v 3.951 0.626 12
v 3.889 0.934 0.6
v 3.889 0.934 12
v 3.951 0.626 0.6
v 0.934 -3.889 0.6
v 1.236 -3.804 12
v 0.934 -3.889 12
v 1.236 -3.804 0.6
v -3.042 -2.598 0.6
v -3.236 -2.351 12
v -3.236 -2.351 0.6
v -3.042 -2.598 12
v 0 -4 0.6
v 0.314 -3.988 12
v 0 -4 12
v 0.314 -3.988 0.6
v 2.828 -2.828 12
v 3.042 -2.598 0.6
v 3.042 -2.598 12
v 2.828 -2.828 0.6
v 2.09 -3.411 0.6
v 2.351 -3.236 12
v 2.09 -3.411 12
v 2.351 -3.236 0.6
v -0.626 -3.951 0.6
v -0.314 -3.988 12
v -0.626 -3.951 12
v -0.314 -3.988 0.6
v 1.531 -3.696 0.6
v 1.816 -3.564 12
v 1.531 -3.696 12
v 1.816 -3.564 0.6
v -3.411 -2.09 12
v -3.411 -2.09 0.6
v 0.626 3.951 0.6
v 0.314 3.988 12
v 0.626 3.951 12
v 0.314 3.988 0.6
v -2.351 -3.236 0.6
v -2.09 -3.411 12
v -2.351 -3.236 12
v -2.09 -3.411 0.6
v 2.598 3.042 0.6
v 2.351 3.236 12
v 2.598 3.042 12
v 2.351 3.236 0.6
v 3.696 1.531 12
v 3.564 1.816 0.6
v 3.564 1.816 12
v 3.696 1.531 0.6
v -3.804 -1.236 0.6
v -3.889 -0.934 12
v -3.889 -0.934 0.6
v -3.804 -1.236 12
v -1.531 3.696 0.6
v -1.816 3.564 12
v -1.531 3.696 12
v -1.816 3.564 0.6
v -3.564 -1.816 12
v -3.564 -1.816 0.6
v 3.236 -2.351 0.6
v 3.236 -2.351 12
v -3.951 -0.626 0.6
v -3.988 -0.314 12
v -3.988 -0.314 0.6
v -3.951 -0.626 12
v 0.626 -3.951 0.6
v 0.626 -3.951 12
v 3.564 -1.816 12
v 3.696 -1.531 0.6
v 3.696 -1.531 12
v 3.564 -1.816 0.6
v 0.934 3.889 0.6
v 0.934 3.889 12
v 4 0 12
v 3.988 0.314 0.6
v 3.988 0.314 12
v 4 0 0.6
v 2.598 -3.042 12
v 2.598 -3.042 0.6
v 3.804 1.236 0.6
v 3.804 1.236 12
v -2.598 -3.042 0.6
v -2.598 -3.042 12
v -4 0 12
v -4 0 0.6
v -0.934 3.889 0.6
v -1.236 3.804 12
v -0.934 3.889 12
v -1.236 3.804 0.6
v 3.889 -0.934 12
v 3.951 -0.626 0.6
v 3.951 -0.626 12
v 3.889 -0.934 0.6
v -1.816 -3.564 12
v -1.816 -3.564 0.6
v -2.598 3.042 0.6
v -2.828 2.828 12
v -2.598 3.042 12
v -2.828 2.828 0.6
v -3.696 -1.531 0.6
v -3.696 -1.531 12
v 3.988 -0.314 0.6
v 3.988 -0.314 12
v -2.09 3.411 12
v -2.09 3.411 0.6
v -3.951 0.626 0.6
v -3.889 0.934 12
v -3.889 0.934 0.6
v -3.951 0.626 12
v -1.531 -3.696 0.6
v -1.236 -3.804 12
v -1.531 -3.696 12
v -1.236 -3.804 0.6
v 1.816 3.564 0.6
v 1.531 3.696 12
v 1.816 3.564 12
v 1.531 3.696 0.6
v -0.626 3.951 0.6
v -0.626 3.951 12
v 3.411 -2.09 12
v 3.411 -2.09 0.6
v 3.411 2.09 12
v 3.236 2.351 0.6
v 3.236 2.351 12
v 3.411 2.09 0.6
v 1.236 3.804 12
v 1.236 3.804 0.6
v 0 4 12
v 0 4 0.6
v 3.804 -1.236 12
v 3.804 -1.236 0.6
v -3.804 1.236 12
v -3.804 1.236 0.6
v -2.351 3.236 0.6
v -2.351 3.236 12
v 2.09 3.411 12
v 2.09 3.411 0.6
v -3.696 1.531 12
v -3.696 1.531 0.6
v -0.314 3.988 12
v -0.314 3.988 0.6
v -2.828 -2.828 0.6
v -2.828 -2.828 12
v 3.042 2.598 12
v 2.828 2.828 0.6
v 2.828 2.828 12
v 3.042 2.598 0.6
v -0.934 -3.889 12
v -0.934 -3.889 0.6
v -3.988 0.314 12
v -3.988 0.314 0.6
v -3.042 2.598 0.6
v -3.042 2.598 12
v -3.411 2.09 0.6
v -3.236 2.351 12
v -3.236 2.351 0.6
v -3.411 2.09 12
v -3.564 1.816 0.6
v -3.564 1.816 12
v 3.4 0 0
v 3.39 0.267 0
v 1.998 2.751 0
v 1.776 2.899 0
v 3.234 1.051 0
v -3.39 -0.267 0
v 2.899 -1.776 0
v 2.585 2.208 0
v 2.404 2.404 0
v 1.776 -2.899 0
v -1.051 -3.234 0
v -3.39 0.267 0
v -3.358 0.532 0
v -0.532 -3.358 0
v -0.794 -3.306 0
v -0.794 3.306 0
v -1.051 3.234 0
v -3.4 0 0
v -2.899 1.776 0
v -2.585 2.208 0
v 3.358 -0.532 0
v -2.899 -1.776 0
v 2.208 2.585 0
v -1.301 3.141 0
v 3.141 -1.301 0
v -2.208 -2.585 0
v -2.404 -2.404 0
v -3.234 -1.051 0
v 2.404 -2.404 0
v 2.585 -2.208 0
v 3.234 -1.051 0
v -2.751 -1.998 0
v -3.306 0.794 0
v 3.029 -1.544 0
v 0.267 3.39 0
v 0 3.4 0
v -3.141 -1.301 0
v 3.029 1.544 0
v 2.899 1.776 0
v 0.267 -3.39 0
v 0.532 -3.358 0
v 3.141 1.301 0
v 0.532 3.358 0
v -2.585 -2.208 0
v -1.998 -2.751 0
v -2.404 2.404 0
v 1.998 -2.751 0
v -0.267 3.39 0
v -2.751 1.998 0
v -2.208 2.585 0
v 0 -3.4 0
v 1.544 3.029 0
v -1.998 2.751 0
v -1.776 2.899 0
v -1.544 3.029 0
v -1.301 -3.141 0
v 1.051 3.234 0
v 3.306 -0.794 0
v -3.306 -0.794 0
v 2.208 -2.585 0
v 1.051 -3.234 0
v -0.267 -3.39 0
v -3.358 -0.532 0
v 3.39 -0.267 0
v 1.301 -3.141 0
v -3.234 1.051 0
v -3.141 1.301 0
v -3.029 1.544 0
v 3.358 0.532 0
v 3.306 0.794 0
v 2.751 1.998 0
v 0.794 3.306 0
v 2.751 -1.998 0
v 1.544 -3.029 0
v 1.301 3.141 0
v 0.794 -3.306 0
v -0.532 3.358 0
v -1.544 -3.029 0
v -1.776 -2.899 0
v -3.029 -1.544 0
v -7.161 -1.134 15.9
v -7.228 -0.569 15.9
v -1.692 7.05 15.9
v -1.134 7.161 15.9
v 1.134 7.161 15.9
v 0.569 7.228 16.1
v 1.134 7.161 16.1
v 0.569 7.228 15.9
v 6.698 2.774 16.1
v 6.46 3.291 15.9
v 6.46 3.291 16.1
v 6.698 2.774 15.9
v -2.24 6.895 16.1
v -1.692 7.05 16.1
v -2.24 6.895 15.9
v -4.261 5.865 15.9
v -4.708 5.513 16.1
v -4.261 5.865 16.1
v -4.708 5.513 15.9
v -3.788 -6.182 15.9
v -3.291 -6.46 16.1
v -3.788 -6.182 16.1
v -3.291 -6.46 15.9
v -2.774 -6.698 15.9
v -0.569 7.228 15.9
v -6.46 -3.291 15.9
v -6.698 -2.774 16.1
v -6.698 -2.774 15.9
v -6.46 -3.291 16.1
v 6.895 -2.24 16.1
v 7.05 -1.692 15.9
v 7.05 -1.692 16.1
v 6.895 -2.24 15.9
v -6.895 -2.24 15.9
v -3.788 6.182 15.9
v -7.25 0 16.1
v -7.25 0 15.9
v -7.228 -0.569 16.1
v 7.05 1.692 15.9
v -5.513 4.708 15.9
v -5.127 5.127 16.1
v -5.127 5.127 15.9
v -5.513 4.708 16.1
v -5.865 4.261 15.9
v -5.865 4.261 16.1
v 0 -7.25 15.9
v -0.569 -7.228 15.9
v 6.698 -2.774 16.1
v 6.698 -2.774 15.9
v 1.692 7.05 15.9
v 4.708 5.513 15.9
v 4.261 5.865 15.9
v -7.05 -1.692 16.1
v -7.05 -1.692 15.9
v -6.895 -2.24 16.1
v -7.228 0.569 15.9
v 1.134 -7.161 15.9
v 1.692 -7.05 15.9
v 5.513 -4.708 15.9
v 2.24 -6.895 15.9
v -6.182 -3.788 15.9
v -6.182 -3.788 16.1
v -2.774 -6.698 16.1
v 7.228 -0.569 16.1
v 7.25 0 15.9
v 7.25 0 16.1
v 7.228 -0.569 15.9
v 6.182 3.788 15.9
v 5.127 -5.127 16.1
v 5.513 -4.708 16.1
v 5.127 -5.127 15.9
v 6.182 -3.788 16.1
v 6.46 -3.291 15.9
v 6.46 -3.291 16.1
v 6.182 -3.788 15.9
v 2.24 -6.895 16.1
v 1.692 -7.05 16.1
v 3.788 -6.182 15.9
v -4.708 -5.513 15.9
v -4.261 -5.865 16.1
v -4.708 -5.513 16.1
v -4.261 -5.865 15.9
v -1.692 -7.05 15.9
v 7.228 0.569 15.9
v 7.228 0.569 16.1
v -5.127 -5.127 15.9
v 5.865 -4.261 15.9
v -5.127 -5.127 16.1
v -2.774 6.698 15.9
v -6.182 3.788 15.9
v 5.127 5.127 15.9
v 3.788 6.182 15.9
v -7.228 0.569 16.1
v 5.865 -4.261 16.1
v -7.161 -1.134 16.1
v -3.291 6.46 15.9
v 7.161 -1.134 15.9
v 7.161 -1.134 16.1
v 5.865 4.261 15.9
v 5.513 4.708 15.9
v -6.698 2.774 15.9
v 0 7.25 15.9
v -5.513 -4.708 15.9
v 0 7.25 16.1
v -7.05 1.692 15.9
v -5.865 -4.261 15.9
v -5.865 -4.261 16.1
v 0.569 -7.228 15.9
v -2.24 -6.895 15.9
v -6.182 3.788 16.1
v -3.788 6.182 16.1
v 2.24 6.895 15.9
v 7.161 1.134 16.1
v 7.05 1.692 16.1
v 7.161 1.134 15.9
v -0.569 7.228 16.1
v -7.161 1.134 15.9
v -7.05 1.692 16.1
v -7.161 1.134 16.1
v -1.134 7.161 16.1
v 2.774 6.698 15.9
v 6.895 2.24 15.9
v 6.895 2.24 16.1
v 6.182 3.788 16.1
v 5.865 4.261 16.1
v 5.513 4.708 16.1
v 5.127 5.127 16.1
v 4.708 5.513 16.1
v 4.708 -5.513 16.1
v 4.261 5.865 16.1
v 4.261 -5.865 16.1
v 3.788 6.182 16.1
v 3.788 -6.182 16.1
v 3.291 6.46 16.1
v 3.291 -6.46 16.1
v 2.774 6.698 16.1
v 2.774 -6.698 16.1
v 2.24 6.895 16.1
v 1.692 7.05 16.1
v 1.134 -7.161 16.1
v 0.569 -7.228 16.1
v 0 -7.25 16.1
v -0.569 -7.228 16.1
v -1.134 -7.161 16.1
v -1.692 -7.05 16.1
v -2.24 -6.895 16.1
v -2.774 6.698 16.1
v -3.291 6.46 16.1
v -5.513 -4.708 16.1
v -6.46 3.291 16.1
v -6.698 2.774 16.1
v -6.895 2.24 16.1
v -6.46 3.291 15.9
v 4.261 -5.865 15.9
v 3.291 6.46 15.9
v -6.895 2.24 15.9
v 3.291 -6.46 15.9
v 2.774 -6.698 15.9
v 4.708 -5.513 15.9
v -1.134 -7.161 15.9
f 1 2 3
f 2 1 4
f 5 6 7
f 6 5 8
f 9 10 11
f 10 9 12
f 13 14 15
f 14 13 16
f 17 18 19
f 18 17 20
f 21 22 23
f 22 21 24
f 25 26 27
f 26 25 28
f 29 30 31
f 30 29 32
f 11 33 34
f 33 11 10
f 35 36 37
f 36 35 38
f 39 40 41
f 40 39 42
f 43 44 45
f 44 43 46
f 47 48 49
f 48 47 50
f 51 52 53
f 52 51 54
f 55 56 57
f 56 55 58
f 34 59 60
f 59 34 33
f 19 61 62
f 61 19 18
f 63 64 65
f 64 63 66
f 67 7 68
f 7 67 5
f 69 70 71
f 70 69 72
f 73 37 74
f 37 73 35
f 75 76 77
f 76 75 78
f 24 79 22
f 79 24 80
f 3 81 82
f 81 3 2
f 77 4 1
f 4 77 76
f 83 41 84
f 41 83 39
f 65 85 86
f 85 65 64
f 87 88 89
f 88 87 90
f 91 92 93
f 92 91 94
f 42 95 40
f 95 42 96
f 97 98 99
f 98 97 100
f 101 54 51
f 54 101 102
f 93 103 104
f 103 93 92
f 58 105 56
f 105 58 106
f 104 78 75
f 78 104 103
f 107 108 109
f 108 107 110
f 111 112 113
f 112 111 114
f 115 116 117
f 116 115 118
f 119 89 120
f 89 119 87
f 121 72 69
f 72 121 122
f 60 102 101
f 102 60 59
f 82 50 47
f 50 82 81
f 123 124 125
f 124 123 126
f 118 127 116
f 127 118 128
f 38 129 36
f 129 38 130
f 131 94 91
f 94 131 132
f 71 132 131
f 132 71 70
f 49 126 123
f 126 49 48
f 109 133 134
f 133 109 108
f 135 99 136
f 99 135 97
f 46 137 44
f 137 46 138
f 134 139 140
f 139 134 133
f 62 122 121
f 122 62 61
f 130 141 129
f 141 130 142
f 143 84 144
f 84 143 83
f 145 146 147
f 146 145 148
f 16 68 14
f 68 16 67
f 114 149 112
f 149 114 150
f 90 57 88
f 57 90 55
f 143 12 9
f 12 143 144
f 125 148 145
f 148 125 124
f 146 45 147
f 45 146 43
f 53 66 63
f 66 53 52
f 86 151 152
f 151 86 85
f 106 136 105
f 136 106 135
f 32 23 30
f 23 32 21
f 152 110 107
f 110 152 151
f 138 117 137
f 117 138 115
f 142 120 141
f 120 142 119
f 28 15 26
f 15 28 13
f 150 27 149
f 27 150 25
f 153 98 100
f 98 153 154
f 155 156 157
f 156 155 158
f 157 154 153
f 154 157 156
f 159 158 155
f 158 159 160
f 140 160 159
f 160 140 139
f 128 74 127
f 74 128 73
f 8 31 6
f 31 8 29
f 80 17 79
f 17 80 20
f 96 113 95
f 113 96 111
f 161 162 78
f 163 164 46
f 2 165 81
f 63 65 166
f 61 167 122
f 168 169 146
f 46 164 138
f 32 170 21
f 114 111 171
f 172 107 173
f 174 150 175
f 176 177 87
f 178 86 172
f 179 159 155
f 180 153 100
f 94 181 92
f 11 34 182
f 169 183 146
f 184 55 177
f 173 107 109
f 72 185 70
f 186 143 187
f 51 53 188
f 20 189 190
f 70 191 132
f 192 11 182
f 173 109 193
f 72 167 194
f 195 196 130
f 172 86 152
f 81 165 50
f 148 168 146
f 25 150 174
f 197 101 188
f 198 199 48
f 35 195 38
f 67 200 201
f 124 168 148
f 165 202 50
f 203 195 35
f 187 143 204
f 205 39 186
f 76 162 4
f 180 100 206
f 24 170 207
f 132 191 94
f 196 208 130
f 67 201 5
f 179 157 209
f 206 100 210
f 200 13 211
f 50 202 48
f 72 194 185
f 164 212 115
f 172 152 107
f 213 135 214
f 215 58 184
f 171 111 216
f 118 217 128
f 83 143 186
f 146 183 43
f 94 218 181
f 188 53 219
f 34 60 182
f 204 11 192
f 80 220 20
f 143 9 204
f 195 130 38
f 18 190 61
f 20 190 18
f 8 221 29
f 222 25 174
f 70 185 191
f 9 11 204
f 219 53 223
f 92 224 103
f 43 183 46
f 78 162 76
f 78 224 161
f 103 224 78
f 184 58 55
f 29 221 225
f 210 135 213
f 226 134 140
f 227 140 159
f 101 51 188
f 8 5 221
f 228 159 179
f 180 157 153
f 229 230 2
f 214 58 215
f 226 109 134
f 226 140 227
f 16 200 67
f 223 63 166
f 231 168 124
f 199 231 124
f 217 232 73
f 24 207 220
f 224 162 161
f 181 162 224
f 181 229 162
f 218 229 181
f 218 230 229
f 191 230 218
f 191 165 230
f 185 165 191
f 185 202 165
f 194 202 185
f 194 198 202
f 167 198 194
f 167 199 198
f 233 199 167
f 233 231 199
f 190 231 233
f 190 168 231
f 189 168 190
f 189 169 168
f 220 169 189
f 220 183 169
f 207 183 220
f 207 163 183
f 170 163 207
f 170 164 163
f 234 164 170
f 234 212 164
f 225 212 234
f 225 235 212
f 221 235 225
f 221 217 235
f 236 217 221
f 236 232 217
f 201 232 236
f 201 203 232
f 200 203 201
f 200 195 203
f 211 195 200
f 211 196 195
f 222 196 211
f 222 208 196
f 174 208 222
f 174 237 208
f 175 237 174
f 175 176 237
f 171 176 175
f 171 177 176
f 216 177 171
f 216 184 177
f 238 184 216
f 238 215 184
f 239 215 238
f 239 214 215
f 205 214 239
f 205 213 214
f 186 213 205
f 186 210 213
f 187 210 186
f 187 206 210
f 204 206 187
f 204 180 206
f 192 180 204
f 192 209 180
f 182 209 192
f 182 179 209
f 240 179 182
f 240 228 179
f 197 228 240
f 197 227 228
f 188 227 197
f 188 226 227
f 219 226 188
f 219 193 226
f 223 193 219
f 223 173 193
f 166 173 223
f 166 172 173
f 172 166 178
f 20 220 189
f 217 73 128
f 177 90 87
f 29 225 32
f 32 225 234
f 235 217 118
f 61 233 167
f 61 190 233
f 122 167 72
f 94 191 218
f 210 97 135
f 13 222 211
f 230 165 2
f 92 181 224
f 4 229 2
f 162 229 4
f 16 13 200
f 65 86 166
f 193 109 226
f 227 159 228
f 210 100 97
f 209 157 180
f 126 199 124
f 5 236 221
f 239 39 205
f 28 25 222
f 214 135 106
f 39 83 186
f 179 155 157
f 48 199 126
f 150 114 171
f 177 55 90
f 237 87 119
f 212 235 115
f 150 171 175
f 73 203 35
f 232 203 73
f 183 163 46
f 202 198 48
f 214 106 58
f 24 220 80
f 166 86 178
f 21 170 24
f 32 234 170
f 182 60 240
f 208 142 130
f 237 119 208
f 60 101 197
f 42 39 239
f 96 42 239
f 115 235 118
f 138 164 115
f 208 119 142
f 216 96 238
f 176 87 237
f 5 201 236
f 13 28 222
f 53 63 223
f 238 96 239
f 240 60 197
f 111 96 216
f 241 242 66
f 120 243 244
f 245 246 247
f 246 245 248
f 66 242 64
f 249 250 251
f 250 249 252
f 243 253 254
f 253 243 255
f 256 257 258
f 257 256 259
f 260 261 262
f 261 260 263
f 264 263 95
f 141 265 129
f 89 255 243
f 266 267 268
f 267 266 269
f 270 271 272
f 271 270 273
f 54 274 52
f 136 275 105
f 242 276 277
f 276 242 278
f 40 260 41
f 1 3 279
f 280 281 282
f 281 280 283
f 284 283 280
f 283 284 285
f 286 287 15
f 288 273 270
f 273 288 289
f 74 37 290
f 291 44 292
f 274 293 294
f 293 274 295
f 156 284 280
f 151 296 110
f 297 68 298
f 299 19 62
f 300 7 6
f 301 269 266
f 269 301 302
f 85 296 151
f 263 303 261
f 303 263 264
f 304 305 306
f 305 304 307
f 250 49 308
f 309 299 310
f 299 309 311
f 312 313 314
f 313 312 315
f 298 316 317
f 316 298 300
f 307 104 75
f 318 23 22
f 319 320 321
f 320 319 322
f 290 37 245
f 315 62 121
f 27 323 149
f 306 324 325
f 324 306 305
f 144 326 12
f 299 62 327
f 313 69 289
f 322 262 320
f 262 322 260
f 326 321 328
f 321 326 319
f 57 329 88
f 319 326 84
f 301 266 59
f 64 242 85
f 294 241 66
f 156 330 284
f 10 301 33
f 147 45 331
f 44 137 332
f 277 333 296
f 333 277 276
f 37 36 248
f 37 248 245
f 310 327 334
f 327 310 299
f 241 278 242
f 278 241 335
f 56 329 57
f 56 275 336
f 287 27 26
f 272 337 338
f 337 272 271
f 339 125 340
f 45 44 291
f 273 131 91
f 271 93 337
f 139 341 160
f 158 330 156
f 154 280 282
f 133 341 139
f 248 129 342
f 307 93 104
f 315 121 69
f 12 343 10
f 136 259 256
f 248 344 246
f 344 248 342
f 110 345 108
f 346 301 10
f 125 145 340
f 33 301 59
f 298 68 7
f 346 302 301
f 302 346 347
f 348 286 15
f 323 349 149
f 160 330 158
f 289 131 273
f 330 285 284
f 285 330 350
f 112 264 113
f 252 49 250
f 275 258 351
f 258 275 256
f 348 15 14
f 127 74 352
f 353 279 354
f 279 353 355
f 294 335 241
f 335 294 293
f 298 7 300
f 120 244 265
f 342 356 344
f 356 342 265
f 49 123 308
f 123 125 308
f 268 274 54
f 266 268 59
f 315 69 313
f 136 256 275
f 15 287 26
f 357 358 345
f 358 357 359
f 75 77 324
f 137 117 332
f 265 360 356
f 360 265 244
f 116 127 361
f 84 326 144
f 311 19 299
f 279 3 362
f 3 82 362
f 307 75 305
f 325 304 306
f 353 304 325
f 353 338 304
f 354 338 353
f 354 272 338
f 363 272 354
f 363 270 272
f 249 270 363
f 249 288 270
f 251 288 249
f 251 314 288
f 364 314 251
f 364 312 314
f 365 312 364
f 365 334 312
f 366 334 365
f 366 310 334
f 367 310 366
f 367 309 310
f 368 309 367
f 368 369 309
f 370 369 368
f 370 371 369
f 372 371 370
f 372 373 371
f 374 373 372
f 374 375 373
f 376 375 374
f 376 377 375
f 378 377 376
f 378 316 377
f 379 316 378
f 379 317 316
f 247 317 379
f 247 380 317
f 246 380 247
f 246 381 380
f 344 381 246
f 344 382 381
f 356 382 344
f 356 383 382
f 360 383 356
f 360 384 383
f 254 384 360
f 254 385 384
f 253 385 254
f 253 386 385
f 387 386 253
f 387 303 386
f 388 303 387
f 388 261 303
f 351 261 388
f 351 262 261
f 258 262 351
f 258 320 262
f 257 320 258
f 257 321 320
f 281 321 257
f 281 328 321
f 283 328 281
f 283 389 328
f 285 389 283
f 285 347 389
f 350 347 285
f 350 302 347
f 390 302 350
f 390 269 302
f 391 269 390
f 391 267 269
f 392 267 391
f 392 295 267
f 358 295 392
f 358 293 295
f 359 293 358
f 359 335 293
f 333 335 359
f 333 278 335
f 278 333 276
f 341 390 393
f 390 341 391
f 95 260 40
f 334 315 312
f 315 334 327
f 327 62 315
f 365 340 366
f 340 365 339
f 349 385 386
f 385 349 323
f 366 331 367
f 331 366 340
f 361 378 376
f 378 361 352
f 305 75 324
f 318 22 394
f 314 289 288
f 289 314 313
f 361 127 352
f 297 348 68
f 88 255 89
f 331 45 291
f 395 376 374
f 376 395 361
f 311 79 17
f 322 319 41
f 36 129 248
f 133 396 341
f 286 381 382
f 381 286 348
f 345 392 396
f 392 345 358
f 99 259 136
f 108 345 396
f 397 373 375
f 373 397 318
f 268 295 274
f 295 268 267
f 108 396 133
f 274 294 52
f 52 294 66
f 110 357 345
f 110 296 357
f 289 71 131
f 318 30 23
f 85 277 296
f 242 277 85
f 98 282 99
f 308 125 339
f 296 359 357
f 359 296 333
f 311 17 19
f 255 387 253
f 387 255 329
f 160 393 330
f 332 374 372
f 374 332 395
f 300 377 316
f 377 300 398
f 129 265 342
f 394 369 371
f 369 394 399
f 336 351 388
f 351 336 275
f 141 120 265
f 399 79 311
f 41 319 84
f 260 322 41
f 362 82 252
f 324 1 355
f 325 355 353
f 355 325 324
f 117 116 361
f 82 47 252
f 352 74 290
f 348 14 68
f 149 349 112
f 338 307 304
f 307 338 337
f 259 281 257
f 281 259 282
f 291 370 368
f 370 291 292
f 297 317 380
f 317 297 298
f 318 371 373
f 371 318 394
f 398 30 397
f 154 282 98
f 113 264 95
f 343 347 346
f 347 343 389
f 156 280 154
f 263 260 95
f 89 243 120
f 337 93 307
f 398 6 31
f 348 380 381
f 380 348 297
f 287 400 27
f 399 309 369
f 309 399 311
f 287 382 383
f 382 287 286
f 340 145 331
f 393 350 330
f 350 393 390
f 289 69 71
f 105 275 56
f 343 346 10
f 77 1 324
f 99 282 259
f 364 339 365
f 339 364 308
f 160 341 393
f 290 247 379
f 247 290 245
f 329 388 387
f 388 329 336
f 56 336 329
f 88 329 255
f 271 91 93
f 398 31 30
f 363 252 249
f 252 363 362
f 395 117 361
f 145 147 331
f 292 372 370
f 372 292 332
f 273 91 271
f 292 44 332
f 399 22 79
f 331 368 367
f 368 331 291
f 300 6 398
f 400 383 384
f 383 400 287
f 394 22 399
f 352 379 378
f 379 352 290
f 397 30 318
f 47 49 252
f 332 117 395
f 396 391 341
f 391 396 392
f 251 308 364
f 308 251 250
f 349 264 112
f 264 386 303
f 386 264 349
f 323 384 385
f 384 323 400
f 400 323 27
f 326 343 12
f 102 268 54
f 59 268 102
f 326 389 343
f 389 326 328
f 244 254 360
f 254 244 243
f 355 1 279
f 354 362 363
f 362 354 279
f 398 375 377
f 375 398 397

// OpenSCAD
/*
 * 0 - default library state
 * 1 - countersunk head screw
 */
screw_lib_object = 0;

/***** screw parameters *****/

/*
 * 1 - cross 
 */
head_type = 1;

head_shape = 1;


/* diameter, length, head_diameter, haed_height, head_diameter, screw_height*/

M8x16=[8,16,4,14.5,0.6]; 


module countersunk_head_screw(parameters,head_type, screw_shape)
{
    translate([0,0,parameters[4]])cylinder(d=parameters[0], h=parameters[1]-parameters[4],$fn=10*parameters[0]);
    cylinder(d1=parameters[0]-2*parameters[4],d2=parameters[0],h=parameters[4],$fn=parameters[0]*10);
    
    hull()
    {
        translate([0,0,parameters[1]-parameters[2]])cylinder(d=parameters[0],h=0.01,$fn=10*parameters[0]);
    
        translate([0,0,parameters[1]-0.1])cylinder(d=parameters[3],h=0.2,$fn=10*parameters[0]);
    }
    
}

if(screw_lib_object == 0)
{
    countersunk_head_screw(M8x16);
}
else
{
    echo("Wrong object index! No object shown.");
}
